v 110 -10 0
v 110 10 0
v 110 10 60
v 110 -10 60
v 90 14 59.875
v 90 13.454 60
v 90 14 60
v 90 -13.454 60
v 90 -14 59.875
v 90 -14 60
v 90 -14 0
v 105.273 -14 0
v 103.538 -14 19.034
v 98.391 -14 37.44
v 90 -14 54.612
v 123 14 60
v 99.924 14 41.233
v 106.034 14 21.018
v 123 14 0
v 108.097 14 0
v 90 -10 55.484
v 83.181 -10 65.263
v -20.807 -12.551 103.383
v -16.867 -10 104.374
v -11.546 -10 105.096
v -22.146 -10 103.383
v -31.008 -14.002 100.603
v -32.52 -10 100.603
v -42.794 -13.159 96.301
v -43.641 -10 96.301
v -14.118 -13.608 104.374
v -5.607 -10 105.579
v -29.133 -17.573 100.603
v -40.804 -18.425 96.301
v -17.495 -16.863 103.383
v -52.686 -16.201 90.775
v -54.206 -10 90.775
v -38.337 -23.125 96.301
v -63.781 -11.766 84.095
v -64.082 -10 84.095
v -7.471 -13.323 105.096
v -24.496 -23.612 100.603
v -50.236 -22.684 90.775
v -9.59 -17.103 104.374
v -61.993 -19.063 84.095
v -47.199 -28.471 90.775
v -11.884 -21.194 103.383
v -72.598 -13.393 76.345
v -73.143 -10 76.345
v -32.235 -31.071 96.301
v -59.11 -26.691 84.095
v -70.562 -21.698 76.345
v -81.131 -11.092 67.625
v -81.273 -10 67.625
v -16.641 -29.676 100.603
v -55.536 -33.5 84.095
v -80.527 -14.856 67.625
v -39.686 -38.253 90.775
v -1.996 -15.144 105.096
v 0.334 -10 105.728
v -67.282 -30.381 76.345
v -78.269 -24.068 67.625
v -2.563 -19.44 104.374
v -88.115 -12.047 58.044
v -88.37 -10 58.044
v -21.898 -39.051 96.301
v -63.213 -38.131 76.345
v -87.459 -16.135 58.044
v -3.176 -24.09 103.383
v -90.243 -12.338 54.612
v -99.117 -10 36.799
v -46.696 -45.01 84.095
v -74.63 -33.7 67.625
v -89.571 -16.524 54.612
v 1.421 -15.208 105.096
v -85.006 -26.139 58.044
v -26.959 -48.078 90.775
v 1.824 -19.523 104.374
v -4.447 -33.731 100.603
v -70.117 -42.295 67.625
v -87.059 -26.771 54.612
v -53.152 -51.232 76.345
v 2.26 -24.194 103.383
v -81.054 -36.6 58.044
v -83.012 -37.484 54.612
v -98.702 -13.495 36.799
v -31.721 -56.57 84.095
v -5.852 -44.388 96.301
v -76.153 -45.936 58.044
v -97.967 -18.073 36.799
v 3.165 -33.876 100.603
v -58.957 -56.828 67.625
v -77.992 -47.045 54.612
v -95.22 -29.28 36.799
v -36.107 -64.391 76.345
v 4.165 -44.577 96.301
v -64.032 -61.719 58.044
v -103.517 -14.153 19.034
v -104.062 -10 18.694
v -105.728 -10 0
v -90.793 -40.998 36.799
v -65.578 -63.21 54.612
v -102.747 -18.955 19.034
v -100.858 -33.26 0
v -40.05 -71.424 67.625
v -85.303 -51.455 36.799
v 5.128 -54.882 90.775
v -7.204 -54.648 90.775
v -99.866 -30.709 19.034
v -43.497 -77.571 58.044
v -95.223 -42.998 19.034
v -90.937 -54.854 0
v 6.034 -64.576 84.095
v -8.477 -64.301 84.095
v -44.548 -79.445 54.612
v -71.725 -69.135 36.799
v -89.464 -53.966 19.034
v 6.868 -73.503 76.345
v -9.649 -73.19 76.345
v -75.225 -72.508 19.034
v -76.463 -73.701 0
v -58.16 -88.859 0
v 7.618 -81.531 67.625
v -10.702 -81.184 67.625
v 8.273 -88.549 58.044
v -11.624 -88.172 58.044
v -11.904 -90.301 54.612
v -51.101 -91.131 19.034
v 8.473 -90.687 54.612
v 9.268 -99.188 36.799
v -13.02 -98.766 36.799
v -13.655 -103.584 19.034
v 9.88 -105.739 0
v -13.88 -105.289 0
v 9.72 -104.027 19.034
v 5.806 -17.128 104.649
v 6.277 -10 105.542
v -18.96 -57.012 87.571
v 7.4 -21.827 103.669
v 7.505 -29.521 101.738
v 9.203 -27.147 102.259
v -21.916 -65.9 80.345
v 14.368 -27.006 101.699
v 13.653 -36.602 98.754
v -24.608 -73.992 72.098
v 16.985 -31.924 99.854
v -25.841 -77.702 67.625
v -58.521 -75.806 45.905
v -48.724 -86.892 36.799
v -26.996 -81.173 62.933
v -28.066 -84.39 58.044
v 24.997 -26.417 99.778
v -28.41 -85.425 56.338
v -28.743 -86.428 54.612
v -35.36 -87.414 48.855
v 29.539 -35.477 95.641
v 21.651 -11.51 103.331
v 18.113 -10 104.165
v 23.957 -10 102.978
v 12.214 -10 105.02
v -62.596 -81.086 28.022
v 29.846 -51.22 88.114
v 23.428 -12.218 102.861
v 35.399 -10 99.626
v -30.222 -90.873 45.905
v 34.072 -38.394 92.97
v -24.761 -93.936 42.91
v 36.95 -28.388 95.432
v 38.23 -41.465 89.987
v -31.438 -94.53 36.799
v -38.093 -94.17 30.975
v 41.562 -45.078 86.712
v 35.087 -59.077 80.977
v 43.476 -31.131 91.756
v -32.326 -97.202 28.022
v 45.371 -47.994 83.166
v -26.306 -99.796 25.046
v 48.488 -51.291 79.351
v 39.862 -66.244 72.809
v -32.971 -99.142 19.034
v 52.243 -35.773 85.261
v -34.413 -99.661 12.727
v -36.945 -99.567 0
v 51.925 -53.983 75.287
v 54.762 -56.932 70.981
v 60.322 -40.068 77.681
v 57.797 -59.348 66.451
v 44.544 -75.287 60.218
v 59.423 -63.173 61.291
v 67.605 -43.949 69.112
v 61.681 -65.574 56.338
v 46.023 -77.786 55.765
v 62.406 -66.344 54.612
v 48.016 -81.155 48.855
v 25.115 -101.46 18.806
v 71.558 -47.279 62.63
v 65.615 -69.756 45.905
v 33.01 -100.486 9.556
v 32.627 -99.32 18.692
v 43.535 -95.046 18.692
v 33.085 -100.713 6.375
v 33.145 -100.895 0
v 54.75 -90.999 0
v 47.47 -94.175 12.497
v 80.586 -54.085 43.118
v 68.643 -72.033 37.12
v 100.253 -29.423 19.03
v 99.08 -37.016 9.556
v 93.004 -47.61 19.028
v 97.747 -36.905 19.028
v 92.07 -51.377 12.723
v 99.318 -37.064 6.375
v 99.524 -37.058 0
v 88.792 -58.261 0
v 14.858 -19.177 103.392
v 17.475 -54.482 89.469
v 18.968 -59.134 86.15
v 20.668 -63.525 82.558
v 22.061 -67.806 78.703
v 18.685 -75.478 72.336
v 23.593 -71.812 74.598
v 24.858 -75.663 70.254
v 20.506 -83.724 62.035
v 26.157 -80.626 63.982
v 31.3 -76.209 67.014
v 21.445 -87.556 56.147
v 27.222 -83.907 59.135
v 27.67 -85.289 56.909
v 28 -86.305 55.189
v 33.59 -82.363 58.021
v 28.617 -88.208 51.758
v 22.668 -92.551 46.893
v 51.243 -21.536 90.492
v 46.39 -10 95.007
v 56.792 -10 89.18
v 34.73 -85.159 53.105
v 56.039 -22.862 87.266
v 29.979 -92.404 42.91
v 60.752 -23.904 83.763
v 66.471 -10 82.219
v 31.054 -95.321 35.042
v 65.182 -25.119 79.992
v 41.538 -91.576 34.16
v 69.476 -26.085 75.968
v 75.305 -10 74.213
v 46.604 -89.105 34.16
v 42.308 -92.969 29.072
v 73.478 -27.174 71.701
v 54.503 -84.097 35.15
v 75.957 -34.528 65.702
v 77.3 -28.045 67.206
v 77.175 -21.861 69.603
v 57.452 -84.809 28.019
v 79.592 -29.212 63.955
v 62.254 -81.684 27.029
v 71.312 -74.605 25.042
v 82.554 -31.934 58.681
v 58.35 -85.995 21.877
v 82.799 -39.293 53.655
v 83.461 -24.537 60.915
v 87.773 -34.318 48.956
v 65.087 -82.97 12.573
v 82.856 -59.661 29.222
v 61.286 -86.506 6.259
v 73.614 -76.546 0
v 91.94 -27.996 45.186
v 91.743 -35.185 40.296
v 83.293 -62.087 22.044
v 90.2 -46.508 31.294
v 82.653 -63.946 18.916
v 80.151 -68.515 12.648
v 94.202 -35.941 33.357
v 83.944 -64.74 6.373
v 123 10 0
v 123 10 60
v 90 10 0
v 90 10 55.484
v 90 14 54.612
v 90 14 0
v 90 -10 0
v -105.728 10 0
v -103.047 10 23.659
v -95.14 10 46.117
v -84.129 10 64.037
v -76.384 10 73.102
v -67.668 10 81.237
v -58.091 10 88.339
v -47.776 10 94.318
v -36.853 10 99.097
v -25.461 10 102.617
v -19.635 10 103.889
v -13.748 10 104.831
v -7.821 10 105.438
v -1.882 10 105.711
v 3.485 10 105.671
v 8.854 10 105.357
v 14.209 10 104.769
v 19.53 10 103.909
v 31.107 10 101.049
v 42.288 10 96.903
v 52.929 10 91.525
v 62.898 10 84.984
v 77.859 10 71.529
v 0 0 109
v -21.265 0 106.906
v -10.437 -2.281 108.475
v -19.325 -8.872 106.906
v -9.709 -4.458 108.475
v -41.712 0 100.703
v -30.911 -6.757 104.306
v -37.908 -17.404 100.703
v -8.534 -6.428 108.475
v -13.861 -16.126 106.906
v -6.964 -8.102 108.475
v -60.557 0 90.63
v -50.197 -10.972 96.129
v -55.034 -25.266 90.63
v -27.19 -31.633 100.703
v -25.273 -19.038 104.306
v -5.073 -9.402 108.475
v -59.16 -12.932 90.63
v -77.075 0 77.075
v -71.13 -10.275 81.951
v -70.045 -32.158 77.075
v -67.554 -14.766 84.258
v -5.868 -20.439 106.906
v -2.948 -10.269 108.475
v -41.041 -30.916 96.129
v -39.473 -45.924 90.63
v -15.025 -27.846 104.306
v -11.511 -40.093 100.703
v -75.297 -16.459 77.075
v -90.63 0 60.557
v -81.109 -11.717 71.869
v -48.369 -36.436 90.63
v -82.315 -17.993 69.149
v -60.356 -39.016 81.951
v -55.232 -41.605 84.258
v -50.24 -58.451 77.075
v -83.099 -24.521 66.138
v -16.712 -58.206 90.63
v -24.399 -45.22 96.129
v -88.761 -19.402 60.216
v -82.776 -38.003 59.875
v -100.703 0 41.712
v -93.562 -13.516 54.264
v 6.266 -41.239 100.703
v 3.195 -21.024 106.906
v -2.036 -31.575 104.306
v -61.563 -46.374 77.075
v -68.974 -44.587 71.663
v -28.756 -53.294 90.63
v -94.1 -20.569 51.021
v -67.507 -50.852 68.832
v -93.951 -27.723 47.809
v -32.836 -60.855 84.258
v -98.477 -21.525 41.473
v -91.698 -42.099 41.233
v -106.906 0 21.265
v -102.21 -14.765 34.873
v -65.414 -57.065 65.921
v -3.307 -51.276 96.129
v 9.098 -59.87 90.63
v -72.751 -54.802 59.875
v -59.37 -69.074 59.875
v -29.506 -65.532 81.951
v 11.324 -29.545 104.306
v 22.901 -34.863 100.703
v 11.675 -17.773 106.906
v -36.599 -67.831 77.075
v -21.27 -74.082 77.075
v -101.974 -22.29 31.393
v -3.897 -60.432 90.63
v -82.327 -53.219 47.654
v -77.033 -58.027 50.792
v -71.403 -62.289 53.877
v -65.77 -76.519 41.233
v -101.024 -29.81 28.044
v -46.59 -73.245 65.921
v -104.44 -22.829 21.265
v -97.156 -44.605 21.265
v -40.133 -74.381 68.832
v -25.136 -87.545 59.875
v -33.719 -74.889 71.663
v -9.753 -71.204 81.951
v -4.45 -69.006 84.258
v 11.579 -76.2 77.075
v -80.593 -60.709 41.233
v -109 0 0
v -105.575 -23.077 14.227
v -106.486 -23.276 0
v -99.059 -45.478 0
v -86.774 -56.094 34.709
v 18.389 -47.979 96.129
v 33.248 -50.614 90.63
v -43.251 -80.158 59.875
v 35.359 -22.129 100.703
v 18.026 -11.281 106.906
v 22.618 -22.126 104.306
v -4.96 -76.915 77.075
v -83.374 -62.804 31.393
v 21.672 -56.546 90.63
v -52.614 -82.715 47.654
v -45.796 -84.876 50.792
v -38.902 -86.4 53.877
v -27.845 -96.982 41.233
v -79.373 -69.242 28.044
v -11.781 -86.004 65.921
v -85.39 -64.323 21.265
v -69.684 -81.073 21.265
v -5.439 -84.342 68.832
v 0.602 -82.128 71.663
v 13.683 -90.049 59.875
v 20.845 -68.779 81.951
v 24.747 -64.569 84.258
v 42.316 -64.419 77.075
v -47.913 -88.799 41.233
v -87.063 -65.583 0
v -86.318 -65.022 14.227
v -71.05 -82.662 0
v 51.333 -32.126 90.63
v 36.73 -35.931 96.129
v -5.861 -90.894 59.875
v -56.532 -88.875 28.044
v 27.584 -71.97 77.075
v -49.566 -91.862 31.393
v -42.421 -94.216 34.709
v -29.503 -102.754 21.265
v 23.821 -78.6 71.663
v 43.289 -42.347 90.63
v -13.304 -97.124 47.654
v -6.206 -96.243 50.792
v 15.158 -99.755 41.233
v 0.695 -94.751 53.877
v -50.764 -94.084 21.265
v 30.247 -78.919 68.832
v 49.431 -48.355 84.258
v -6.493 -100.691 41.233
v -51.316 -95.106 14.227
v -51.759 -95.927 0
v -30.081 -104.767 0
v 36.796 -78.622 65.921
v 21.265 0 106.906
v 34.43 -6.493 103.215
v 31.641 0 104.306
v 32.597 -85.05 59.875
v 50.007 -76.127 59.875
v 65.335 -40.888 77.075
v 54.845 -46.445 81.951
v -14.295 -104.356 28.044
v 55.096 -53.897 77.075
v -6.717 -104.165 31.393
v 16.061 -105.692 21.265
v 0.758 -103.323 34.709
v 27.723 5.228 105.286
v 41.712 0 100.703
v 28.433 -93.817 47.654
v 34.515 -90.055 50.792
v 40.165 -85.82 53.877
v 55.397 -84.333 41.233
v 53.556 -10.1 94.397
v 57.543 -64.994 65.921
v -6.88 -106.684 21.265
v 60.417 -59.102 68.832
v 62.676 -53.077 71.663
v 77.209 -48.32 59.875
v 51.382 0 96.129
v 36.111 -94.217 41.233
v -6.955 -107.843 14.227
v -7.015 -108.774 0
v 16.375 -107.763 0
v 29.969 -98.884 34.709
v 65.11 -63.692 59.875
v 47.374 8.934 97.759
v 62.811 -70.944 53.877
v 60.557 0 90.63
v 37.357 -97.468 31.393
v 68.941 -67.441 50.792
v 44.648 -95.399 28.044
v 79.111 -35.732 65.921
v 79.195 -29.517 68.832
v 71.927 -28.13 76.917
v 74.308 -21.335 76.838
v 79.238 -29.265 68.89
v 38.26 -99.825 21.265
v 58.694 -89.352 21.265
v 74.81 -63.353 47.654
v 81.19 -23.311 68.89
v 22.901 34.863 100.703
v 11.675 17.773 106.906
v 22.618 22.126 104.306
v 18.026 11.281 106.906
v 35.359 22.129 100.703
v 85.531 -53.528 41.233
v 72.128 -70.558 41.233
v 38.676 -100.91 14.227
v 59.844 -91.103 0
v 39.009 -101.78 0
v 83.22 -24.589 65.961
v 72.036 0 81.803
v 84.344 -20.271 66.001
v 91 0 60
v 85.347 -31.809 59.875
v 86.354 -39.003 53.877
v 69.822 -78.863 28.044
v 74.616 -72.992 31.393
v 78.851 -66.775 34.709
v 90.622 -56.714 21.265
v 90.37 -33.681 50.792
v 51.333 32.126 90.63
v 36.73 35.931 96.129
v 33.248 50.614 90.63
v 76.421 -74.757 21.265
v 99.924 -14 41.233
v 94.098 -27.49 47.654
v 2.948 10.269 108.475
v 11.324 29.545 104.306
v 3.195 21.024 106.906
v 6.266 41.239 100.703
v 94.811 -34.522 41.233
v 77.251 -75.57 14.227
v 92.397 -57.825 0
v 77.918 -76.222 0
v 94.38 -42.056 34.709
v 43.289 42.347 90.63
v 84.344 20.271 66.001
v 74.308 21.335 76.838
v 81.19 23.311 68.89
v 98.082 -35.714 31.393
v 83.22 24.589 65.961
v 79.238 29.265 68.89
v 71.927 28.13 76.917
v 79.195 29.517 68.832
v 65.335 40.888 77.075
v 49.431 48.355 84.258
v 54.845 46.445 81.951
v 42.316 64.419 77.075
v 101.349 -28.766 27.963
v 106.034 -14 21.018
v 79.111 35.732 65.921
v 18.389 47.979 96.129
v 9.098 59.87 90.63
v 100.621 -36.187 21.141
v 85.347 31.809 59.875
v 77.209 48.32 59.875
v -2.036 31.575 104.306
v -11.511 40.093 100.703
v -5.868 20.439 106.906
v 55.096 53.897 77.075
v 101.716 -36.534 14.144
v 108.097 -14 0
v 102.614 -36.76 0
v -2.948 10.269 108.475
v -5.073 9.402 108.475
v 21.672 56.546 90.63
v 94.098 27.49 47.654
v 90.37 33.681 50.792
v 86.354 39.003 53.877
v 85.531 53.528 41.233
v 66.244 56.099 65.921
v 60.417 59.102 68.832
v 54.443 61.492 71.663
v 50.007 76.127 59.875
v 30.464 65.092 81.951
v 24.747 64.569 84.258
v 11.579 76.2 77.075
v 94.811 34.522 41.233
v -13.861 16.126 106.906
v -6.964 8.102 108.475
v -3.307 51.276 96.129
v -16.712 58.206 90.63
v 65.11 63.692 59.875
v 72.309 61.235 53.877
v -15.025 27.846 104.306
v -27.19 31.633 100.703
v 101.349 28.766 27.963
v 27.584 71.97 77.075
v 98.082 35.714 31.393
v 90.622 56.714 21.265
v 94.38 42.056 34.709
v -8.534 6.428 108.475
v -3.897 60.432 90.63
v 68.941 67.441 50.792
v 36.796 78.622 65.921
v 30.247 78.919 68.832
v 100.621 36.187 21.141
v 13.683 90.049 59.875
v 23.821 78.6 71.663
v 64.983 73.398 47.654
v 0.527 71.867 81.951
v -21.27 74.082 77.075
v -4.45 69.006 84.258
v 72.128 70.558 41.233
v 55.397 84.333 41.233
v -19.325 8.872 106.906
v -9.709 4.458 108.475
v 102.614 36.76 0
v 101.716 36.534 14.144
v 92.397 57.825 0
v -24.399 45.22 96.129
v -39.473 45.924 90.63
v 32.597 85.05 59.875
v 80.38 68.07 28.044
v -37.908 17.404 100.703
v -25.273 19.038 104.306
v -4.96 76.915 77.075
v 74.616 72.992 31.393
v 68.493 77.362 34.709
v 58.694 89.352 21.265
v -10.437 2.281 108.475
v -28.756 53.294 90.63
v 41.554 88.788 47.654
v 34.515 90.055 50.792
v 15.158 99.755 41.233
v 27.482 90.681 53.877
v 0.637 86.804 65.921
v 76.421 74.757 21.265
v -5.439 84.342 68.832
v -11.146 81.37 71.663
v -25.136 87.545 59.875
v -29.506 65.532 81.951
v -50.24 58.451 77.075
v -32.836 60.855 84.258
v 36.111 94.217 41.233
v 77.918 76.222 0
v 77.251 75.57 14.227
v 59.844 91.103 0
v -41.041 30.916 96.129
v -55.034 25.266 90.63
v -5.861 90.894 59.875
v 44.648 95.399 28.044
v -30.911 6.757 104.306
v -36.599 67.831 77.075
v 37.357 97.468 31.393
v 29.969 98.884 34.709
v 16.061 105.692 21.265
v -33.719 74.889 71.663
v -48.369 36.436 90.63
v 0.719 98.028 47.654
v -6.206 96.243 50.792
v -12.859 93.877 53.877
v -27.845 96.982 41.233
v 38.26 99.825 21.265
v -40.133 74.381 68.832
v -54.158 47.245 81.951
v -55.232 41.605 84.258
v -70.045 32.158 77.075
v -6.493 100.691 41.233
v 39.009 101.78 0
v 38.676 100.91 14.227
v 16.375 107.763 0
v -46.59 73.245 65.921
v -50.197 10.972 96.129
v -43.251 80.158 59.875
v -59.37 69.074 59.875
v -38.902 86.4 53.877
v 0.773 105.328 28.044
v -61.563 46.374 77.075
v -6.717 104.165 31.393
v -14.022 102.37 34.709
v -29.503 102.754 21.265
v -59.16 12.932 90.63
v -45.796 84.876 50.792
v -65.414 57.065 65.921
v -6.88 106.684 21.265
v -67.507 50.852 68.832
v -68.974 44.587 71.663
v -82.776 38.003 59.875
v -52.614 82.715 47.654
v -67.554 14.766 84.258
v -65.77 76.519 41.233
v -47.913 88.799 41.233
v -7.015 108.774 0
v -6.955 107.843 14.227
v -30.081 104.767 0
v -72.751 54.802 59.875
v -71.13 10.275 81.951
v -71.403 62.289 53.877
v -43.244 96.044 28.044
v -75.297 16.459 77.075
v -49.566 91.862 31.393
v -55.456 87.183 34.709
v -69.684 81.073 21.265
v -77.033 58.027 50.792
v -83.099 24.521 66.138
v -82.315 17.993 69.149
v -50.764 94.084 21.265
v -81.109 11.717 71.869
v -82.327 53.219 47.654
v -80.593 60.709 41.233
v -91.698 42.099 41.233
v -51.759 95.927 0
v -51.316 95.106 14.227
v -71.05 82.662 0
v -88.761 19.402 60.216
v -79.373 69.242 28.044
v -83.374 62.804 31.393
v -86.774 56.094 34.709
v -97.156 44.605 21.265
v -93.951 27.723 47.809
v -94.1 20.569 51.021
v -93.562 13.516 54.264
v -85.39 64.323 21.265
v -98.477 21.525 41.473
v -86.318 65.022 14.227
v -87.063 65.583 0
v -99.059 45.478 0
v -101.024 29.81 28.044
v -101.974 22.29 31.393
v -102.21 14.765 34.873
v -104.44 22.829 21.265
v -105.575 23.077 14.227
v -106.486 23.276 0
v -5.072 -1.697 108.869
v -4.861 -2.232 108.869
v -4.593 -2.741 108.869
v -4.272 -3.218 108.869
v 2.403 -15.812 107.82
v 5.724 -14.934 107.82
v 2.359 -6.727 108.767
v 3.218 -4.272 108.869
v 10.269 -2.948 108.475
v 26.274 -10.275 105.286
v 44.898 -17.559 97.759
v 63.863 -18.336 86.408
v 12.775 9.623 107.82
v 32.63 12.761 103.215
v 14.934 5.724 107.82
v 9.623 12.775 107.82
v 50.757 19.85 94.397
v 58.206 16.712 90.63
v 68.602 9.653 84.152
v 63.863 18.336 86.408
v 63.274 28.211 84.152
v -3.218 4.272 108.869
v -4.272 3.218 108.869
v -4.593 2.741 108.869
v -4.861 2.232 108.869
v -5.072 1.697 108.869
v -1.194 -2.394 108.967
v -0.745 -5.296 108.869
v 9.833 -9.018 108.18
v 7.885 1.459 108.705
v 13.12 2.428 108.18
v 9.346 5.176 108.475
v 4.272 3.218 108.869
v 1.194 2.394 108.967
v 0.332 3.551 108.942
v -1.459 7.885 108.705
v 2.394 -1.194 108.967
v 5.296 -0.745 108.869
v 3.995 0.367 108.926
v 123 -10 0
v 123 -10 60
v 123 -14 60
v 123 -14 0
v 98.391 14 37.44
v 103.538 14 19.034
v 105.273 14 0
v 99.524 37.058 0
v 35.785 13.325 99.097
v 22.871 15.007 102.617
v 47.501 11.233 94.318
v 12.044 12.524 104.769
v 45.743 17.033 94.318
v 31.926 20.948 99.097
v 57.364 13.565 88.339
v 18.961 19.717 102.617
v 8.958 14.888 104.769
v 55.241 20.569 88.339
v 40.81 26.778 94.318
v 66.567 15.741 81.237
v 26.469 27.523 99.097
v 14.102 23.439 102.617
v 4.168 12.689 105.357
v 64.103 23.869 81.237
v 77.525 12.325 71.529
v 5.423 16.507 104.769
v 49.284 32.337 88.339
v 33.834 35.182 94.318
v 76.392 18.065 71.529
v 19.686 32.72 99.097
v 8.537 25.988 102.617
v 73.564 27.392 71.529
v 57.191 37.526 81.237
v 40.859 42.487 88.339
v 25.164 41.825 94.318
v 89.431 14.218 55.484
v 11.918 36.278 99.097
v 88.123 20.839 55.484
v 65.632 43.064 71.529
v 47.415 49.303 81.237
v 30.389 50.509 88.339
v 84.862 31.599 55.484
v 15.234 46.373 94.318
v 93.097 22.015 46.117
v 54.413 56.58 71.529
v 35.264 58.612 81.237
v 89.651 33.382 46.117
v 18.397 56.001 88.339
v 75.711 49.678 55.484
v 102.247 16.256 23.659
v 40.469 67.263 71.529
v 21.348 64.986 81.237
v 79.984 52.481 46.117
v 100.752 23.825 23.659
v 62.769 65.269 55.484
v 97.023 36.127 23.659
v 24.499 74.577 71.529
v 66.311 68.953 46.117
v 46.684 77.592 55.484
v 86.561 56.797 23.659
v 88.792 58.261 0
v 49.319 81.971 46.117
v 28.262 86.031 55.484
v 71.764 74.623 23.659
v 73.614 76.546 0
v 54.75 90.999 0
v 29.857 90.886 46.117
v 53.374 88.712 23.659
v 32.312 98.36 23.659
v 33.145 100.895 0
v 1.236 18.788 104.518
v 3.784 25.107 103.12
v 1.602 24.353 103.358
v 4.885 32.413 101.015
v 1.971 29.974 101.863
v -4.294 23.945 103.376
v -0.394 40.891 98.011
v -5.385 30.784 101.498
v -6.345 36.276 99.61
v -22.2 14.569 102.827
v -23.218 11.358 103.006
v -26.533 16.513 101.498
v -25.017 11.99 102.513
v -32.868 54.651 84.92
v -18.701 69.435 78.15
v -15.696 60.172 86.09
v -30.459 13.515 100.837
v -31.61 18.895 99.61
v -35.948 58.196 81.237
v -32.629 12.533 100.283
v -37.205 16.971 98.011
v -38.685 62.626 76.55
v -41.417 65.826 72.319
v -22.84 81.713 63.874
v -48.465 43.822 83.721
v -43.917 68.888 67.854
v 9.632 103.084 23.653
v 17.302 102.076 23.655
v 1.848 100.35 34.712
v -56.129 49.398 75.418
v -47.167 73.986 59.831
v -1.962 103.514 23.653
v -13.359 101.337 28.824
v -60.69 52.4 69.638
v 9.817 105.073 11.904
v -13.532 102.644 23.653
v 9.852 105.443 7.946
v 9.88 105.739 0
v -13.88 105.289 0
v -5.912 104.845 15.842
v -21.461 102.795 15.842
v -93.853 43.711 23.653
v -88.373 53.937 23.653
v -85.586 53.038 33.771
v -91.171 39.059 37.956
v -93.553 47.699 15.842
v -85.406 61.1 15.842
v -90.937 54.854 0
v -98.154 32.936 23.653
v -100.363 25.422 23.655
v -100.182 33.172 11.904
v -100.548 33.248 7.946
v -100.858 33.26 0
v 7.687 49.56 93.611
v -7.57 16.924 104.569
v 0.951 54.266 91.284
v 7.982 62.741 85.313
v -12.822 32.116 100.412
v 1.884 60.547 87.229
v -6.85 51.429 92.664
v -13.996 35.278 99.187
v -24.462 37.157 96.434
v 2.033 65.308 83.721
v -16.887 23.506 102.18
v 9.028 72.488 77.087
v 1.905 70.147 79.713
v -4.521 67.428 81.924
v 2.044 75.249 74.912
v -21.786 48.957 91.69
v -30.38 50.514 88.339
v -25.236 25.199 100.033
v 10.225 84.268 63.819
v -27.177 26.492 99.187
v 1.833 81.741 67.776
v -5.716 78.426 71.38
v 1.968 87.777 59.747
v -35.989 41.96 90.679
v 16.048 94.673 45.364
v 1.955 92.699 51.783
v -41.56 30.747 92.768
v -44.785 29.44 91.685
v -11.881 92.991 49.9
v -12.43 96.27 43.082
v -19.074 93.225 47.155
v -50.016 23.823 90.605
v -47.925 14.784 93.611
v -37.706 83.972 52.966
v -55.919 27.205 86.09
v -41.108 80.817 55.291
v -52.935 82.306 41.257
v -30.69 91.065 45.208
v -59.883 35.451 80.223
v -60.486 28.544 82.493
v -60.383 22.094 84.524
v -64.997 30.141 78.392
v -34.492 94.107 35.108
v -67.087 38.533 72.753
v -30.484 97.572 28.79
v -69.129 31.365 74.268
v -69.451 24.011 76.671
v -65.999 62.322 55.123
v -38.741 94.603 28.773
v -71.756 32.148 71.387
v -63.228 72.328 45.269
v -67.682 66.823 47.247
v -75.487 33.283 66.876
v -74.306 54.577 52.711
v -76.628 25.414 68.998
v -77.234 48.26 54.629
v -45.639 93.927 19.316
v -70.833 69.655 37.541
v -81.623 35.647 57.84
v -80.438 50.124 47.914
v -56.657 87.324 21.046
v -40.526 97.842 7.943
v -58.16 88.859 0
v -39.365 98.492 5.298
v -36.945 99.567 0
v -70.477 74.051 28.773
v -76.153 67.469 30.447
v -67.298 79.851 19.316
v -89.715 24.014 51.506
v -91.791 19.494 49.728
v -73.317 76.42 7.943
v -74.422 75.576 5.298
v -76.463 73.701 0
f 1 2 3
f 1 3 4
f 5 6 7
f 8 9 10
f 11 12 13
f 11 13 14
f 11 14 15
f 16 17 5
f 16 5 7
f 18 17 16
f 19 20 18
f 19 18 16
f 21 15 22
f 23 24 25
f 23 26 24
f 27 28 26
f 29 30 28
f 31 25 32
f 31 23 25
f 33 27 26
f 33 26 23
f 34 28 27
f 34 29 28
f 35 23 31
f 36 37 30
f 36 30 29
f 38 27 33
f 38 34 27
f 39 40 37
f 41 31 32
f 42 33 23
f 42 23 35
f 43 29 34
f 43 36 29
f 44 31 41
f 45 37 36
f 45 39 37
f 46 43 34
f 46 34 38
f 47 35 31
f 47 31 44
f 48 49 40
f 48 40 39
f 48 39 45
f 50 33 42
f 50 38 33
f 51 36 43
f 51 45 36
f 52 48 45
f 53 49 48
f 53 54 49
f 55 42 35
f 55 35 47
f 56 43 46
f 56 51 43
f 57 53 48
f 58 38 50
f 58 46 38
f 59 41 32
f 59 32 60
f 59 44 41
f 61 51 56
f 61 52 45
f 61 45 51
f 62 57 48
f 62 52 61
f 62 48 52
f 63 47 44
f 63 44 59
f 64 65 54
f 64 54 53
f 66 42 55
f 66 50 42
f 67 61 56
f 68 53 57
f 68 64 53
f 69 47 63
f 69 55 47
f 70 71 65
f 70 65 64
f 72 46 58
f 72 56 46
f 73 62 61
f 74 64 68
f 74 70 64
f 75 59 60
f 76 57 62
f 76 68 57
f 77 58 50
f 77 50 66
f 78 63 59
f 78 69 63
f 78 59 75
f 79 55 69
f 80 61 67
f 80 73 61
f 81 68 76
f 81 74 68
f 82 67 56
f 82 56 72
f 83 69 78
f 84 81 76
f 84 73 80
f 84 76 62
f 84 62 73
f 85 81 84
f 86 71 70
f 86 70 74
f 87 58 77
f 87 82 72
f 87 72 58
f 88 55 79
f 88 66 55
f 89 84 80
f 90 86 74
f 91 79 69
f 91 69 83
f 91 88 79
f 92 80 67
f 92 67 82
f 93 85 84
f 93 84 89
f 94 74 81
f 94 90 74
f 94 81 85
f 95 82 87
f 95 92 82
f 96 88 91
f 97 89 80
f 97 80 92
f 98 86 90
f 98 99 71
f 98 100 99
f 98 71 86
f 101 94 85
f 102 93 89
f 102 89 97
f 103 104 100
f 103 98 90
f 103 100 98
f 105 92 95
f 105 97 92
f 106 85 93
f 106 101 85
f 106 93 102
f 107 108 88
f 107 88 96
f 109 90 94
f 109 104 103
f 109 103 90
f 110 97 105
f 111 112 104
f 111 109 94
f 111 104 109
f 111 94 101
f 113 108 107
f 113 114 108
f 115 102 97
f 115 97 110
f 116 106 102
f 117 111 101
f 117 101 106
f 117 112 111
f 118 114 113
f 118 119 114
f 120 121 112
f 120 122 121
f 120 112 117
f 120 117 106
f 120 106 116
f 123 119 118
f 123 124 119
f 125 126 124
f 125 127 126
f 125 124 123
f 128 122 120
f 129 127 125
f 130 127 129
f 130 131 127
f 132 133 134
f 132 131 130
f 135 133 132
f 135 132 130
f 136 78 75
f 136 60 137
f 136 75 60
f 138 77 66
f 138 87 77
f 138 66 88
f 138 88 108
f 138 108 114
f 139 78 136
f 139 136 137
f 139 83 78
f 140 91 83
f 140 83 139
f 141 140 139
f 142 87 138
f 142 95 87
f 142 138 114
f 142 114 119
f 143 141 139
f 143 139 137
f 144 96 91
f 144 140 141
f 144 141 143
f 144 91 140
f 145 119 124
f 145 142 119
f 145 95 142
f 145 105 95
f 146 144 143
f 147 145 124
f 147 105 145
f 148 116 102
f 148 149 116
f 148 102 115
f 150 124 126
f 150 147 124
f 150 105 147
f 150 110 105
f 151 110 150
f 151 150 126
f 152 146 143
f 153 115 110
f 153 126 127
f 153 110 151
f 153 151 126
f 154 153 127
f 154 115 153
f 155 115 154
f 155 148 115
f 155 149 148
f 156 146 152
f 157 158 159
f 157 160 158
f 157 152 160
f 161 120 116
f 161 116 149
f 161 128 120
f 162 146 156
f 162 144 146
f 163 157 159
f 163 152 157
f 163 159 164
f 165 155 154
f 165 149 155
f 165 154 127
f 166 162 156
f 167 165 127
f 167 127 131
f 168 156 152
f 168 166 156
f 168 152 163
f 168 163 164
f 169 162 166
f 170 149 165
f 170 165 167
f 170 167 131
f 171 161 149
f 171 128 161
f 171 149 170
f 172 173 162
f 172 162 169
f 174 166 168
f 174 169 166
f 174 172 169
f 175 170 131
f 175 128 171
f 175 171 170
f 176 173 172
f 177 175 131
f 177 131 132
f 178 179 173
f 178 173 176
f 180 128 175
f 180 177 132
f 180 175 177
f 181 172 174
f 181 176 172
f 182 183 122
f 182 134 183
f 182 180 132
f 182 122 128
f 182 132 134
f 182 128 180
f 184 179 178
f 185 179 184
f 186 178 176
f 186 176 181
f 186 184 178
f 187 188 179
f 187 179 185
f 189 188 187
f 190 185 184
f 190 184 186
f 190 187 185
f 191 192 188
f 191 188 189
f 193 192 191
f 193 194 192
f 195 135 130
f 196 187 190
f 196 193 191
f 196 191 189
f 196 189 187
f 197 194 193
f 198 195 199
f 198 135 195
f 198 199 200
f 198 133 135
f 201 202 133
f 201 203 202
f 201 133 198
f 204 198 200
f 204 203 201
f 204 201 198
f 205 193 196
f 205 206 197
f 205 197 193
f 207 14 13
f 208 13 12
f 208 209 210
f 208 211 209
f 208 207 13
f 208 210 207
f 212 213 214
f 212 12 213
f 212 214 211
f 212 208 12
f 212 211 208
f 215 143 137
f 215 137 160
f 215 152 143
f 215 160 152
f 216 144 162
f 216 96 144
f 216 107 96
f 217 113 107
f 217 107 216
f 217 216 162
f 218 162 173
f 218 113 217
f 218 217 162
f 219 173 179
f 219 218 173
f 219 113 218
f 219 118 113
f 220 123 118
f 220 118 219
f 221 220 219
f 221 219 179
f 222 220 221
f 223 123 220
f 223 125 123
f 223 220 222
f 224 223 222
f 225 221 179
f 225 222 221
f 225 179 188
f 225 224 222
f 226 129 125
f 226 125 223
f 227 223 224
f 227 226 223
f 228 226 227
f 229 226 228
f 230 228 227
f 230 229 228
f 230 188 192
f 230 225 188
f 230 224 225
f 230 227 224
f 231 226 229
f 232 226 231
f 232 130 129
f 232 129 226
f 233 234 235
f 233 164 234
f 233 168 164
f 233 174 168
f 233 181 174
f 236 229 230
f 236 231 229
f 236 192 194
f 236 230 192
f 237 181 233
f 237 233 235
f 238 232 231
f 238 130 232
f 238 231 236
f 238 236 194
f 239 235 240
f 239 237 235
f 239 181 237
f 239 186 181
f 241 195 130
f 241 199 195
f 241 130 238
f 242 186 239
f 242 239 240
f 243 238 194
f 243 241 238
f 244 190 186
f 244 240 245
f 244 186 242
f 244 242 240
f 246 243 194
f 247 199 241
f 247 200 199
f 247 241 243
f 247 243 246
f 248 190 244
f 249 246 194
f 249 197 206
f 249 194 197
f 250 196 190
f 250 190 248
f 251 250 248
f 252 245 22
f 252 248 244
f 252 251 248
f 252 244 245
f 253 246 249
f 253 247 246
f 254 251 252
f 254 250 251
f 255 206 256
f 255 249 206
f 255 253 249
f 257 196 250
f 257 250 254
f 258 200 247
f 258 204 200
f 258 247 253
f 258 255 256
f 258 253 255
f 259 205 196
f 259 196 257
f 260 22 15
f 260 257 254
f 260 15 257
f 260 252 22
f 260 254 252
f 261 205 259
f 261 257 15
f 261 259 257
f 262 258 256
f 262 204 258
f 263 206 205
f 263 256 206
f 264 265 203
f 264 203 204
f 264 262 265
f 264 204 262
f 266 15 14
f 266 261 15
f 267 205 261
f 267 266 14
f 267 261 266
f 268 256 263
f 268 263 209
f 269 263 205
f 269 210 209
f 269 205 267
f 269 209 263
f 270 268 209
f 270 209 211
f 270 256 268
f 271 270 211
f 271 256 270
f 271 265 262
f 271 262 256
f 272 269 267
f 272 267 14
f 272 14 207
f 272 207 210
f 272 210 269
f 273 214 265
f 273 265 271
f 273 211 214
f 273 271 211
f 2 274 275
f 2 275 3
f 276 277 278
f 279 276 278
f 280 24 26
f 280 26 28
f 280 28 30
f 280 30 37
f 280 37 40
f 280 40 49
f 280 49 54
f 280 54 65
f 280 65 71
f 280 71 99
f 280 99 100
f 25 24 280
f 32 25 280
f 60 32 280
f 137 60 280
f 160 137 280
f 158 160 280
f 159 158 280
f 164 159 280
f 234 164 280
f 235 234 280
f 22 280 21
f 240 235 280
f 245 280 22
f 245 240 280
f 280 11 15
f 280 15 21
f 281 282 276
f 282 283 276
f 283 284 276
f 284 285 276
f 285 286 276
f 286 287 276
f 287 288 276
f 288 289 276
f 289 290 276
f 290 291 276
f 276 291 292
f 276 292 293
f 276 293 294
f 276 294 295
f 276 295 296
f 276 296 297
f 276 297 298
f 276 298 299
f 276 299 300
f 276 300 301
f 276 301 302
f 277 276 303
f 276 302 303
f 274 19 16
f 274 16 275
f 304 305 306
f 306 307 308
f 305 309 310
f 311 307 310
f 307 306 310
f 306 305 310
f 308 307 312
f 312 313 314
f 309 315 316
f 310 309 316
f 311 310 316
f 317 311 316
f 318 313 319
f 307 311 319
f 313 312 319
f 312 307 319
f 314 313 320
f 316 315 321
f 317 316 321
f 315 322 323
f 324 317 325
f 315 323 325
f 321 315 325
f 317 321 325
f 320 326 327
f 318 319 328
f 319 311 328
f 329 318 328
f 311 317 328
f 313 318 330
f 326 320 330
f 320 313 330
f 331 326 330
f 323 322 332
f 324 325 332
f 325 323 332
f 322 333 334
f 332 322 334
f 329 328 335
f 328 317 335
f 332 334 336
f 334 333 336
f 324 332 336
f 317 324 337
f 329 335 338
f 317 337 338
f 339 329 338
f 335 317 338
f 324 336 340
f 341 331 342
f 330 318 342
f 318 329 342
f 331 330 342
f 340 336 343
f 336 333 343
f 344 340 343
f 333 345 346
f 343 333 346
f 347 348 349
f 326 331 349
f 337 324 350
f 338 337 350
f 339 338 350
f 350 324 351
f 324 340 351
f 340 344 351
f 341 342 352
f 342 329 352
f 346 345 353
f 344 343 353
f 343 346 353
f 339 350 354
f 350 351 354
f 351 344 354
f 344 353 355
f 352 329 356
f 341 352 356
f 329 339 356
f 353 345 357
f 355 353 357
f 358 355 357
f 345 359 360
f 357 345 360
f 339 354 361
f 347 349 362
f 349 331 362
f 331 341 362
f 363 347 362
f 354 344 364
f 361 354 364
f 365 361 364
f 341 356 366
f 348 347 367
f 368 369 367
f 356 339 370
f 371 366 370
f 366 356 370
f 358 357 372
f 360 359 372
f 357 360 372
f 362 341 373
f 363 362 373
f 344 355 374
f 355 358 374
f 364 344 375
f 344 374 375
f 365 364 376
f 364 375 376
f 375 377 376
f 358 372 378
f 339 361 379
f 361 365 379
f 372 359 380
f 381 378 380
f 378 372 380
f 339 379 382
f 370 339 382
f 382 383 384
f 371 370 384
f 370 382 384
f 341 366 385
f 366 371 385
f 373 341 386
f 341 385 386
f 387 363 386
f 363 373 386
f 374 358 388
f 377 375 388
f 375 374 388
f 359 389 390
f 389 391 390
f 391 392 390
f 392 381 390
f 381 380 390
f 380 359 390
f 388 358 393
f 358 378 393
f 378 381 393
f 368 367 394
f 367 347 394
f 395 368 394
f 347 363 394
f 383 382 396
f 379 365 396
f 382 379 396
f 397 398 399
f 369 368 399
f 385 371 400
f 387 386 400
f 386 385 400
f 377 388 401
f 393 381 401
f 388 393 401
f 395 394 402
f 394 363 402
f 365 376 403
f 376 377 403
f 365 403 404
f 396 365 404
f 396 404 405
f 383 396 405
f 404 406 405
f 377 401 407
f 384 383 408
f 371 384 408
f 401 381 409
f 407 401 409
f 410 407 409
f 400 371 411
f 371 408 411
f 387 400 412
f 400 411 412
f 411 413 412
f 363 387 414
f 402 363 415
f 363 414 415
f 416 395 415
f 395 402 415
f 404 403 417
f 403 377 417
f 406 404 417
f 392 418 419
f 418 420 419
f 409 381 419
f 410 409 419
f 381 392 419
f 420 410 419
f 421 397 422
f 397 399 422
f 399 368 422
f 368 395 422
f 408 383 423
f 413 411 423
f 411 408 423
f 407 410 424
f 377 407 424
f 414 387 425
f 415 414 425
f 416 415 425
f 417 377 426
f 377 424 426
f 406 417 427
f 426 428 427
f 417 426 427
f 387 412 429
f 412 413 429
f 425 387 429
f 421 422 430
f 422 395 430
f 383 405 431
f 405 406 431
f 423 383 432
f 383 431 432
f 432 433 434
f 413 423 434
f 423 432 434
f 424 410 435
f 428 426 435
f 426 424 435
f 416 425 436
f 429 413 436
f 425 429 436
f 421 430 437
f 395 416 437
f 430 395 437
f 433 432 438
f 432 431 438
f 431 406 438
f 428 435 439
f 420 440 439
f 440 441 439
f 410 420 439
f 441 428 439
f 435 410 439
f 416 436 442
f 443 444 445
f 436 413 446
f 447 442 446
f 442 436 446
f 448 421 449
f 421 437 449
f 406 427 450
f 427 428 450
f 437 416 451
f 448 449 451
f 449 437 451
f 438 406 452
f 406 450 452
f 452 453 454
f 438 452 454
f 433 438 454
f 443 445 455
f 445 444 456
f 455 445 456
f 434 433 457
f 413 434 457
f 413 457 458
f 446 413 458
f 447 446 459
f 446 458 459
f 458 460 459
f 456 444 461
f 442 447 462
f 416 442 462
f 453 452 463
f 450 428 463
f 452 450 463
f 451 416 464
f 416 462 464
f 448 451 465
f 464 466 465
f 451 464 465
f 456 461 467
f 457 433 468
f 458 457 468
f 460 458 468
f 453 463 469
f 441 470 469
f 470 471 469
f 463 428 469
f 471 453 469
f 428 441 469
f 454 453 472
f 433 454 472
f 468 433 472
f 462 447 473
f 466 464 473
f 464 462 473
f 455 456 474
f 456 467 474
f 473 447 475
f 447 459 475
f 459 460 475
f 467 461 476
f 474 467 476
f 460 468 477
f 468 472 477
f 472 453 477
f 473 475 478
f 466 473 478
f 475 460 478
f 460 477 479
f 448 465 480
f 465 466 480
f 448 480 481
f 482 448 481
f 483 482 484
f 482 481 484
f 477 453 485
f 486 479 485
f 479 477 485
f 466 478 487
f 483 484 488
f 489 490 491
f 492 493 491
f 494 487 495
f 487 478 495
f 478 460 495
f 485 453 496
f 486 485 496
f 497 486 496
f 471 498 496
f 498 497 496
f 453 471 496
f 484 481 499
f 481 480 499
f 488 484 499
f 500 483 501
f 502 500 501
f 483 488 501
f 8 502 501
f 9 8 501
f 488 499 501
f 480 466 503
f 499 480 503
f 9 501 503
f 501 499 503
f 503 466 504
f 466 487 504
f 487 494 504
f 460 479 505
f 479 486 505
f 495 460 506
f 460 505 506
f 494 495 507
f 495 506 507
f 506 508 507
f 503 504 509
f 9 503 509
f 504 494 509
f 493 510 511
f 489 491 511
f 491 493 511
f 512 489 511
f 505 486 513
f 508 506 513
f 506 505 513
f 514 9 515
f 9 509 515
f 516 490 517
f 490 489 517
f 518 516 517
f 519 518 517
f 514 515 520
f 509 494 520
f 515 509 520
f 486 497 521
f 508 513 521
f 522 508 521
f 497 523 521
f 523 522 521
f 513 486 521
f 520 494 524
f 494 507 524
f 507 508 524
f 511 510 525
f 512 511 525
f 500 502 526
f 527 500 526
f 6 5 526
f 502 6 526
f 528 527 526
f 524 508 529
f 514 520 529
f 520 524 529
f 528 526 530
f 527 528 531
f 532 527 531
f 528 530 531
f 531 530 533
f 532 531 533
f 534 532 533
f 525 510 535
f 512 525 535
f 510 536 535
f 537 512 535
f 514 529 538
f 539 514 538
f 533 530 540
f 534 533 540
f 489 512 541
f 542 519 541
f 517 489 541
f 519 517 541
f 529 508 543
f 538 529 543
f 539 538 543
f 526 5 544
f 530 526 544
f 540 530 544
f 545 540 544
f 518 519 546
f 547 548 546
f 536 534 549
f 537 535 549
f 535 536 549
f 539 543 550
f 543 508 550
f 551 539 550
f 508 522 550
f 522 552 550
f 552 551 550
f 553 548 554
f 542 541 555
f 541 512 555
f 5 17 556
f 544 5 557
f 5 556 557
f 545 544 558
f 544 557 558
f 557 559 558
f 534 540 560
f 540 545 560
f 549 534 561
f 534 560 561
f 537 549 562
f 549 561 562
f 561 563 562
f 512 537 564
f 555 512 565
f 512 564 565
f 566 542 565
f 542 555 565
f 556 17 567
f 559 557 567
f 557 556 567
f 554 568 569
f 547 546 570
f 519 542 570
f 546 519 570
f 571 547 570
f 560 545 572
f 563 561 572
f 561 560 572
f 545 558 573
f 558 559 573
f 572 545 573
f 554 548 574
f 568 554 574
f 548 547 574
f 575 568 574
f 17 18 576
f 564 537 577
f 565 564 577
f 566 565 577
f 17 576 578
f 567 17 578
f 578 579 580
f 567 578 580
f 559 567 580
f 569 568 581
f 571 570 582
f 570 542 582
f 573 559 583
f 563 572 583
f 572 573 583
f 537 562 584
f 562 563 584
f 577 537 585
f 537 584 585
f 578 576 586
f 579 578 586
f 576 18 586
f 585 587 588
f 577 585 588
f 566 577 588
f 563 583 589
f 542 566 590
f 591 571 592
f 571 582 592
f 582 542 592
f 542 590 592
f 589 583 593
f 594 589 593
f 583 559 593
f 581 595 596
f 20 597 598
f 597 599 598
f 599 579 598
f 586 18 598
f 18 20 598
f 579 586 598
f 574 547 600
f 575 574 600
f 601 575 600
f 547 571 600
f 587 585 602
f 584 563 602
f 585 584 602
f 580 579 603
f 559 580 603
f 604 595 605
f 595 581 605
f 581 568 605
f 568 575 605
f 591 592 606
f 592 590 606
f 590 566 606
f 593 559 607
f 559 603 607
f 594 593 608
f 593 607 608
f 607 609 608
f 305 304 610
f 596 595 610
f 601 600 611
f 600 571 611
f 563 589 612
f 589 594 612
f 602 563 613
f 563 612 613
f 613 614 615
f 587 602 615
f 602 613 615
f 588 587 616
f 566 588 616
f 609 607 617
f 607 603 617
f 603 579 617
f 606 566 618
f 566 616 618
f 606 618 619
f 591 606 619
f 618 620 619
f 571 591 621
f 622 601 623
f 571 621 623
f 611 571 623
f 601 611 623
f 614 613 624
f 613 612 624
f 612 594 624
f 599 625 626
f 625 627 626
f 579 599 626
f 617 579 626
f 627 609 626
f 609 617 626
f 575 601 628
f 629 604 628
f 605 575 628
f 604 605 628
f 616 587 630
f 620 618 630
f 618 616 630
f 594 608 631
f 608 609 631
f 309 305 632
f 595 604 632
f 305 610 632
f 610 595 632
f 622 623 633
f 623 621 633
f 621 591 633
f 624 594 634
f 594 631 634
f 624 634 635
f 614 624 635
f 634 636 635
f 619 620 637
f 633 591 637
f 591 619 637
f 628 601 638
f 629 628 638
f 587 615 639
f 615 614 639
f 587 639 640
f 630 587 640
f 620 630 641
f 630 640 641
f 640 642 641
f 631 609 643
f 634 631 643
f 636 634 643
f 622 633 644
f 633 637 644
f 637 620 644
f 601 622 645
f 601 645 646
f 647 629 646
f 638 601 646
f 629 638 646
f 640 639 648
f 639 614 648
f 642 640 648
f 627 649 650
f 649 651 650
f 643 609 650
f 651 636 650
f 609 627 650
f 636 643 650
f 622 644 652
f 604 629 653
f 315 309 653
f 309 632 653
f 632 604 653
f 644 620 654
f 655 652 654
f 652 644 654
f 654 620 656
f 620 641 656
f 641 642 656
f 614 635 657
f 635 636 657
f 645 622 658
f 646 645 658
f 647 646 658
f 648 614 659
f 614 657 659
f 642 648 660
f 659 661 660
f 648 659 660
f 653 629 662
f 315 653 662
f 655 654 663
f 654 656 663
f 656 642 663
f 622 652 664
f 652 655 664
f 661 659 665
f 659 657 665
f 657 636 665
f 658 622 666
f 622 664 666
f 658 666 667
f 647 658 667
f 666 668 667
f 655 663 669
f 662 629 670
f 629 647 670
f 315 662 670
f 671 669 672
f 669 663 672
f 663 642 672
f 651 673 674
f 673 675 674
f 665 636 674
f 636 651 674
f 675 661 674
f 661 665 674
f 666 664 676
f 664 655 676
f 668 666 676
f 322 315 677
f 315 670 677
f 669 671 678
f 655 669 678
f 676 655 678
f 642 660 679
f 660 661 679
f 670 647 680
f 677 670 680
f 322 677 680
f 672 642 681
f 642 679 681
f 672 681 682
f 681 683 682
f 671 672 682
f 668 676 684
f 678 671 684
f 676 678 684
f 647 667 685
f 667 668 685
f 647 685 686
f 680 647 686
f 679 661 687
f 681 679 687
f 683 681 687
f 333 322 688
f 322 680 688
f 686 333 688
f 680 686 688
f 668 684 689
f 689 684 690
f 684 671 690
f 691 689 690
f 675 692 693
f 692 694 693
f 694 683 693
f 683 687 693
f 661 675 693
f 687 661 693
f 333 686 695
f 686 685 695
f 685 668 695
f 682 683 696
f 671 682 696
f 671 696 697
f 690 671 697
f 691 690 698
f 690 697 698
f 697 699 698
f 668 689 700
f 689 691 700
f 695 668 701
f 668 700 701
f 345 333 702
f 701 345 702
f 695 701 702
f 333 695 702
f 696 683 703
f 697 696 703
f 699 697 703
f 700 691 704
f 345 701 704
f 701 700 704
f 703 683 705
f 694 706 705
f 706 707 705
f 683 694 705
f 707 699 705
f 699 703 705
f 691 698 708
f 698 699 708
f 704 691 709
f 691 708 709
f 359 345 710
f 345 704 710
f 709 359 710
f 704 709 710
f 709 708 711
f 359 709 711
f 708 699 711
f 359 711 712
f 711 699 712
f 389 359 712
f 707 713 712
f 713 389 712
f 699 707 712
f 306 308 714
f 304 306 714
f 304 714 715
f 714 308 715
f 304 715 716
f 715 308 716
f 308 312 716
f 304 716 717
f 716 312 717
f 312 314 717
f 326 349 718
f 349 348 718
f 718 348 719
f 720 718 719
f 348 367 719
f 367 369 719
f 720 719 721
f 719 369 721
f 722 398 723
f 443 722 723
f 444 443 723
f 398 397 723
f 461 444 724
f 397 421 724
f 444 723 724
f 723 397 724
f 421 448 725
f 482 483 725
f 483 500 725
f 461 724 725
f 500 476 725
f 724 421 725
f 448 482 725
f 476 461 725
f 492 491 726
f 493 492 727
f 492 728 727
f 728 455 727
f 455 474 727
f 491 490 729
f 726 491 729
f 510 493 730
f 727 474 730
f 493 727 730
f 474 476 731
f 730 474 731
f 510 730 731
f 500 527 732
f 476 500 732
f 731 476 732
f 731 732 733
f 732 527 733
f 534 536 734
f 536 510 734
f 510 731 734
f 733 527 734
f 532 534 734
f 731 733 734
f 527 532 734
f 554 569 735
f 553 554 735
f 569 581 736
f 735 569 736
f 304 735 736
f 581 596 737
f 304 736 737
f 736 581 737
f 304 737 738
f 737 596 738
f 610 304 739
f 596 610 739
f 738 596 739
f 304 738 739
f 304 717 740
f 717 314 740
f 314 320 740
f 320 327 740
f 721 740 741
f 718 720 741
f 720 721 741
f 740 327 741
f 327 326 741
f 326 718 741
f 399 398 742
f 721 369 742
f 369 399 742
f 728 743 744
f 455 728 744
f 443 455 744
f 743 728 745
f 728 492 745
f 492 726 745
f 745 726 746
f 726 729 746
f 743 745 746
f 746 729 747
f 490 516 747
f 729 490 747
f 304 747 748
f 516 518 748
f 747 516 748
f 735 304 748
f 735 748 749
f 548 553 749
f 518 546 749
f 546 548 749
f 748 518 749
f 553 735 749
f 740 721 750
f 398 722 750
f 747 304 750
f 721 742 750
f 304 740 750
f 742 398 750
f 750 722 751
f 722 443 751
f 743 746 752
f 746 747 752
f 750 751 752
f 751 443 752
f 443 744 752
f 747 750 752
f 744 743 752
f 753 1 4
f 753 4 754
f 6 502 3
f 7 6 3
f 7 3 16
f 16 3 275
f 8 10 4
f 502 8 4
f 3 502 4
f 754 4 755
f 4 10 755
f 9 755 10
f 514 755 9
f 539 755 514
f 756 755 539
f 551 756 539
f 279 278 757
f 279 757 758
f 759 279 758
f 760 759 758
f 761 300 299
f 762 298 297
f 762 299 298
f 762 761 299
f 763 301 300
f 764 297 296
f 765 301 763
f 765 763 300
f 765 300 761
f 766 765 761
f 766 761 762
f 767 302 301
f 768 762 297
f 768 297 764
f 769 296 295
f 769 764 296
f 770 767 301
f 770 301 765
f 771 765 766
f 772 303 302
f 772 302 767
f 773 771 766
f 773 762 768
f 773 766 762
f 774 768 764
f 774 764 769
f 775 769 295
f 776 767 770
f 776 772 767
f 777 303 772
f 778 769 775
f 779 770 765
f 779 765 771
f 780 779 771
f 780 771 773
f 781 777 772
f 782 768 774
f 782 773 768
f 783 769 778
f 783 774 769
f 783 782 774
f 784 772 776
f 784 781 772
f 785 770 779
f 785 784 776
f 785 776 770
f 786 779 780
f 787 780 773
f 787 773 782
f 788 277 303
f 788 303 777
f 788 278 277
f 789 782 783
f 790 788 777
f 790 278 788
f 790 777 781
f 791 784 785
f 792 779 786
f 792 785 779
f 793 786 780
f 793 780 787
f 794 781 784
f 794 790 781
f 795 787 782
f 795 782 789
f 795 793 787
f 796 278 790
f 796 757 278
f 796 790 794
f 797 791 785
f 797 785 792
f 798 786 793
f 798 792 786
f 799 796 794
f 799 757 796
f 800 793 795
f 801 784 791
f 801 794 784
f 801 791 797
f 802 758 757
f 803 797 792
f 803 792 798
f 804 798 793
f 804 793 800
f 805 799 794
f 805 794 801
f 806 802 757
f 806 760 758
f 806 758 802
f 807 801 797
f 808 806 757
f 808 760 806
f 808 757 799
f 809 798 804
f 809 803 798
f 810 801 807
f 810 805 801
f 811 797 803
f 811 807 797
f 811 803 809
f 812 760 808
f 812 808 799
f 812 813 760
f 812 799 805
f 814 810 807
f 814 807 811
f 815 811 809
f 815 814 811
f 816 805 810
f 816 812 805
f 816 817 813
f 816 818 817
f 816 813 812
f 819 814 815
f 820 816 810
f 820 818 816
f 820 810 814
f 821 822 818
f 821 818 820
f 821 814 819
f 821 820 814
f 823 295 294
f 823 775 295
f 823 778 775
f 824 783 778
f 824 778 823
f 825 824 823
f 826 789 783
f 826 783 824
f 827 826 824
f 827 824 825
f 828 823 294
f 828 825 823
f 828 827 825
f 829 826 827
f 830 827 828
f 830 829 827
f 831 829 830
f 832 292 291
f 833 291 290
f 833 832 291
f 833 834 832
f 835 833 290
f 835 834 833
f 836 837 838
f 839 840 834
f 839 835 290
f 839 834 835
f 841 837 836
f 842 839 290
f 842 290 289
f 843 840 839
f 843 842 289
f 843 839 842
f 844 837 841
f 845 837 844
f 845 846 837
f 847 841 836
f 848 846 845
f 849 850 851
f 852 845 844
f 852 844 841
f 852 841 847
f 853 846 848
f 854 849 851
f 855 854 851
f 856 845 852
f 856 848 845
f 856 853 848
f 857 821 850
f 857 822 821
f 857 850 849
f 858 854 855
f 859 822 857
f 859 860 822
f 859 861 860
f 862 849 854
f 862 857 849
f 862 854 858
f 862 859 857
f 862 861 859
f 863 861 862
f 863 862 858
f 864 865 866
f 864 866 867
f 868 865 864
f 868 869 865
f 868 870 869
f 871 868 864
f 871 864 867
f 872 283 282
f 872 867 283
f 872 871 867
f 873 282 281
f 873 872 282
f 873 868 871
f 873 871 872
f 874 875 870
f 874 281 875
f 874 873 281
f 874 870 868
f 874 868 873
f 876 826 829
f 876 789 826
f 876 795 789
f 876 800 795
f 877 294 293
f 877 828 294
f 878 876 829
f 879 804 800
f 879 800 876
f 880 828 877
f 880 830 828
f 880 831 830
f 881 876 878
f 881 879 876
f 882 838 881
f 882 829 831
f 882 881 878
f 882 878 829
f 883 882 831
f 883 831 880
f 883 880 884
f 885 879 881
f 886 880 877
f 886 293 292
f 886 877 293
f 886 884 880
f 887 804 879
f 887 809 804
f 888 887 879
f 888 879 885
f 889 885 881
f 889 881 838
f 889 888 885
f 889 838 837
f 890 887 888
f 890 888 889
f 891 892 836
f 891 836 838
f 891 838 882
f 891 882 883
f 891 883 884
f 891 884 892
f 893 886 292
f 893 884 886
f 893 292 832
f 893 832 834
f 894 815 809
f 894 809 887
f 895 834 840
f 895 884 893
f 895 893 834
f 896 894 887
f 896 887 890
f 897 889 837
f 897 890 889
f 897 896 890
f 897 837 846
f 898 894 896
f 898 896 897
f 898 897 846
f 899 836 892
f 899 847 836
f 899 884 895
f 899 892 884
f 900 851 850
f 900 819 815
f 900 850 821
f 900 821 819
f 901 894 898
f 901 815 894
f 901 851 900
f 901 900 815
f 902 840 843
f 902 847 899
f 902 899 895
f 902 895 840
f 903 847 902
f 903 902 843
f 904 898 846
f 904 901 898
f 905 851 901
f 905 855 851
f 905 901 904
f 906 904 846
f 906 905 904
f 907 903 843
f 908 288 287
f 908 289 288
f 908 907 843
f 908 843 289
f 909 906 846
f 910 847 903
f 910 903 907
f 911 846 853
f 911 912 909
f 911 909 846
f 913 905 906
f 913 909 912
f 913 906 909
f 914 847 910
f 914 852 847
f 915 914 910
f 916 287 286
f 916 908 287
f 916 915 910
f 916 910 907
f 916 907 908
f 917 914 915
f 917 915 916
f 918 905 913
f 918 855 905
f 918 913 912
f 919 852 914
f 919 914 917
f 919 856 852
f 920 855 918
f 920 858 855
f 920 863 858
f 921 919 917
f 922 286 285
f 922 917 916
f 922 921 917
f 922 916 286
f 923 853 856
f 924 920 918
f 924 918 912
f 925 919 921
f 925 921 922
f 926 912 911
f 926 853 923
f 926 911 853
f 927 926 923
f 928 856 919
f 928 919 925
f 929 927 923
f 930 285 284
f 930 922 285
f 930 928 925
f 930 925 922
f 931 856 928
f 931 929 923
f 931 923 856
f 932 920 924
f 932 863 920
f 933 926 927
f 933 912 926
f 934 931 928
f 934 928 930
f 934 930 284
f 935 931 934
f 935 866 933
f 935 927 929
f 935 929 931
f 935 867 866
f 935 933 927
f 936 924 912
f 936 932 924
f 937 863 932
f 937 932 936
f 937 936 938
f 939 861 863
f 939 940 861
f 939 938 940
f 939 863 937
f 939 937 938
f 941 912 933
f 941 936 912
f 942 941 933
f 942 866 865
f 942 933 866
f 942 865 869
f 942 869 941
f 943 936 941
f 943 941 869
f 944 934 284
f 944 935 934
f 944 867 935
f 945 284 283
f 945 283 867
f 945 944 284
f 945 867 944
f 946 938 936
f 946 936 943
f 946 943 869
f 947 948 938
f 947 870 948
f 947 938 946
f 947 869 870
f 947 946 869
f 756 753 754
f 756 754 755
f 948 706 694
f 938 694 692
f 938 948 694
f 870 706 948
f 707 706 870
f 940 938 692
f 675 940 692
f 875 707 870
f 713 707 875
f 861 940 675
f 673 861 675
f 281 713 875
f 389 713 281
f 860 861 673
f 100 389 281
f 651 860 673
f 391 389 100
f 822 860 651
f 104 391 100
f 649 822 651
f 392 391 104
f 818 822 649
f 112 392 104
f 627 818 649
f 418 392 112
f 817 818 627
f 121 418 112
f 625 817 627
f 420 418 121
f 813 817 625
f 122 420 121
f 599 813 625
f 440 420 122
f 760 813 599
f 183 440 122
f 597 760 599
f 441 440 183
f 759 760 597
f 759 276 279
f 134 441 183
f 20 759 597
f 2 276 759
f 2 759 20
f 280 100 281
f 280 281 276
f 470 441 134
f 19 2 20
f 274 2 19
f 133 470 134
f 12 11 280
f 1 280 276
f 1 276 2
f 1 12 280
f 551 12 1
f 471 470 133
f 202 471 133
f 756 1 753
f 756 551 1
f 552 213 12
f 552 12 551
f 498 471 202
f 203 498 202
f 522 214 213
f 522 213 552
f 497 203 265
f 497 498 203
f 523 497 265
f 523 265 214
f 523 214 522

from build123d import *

# Parameters (mm, degrees)
REVOLUTION001_ANGLE = -180
PAD_DEPTH           = 60


with BuildPart() as part:
    # Sketch → Revolution (revolve)
    with BuildSketch(Plane.XZ):
        with BuildLine():
            ThreePointArc((0, 109), (-77.074639, 77.074639), (-109, 0))
            Line((-109, 0), (-106.2, 0))
            ThreePointArc((0, 106.2), (-75.09474, 75.09474), (-106.2, 0))
            Line((0, 109), (0, 106.2))
        make_face()
    revolve(axis=Axis((0, 0, 0), (0, 0, 1)))

    # Sketch001 (on Face2 of Revolution) → Revolution001 (revolve)
    with BuildSketch(Plane(origin=(0, 0, 0), x_dir=(1, 0, 0), z_dir=(0, 0, -1))):
        with BuildLine():
            Line((0, -10), (0, 10))
            Line((0, 10), (-106.3, 10))
            ThreePointArc((-106.3, 10), (-106.769331, 0), (-106.3, -10))
            Line((0, -10), (-106.3, -10))
        make_face()
    revolve(axis=Axis((0, 0, 0), (0, -1, 0)), revolution_arc=REVOLUTION001_ANGLE)

    # Sketch002 (on Face8 of Revolution001) → Pad (new body)
    with BuildSketch(Plane(origin=(0, 0, 0), x_dir=(1, 0, 0), z_dir=(0, 0, -1))):
        Polygon((90, 14), (90, -14), (123, -14), (123, -10), (110, -10), (110, 10), (123, 10), (123, 14), align=None)
    extrude(amount=-PAD_DEPTH)


solid = part.part
